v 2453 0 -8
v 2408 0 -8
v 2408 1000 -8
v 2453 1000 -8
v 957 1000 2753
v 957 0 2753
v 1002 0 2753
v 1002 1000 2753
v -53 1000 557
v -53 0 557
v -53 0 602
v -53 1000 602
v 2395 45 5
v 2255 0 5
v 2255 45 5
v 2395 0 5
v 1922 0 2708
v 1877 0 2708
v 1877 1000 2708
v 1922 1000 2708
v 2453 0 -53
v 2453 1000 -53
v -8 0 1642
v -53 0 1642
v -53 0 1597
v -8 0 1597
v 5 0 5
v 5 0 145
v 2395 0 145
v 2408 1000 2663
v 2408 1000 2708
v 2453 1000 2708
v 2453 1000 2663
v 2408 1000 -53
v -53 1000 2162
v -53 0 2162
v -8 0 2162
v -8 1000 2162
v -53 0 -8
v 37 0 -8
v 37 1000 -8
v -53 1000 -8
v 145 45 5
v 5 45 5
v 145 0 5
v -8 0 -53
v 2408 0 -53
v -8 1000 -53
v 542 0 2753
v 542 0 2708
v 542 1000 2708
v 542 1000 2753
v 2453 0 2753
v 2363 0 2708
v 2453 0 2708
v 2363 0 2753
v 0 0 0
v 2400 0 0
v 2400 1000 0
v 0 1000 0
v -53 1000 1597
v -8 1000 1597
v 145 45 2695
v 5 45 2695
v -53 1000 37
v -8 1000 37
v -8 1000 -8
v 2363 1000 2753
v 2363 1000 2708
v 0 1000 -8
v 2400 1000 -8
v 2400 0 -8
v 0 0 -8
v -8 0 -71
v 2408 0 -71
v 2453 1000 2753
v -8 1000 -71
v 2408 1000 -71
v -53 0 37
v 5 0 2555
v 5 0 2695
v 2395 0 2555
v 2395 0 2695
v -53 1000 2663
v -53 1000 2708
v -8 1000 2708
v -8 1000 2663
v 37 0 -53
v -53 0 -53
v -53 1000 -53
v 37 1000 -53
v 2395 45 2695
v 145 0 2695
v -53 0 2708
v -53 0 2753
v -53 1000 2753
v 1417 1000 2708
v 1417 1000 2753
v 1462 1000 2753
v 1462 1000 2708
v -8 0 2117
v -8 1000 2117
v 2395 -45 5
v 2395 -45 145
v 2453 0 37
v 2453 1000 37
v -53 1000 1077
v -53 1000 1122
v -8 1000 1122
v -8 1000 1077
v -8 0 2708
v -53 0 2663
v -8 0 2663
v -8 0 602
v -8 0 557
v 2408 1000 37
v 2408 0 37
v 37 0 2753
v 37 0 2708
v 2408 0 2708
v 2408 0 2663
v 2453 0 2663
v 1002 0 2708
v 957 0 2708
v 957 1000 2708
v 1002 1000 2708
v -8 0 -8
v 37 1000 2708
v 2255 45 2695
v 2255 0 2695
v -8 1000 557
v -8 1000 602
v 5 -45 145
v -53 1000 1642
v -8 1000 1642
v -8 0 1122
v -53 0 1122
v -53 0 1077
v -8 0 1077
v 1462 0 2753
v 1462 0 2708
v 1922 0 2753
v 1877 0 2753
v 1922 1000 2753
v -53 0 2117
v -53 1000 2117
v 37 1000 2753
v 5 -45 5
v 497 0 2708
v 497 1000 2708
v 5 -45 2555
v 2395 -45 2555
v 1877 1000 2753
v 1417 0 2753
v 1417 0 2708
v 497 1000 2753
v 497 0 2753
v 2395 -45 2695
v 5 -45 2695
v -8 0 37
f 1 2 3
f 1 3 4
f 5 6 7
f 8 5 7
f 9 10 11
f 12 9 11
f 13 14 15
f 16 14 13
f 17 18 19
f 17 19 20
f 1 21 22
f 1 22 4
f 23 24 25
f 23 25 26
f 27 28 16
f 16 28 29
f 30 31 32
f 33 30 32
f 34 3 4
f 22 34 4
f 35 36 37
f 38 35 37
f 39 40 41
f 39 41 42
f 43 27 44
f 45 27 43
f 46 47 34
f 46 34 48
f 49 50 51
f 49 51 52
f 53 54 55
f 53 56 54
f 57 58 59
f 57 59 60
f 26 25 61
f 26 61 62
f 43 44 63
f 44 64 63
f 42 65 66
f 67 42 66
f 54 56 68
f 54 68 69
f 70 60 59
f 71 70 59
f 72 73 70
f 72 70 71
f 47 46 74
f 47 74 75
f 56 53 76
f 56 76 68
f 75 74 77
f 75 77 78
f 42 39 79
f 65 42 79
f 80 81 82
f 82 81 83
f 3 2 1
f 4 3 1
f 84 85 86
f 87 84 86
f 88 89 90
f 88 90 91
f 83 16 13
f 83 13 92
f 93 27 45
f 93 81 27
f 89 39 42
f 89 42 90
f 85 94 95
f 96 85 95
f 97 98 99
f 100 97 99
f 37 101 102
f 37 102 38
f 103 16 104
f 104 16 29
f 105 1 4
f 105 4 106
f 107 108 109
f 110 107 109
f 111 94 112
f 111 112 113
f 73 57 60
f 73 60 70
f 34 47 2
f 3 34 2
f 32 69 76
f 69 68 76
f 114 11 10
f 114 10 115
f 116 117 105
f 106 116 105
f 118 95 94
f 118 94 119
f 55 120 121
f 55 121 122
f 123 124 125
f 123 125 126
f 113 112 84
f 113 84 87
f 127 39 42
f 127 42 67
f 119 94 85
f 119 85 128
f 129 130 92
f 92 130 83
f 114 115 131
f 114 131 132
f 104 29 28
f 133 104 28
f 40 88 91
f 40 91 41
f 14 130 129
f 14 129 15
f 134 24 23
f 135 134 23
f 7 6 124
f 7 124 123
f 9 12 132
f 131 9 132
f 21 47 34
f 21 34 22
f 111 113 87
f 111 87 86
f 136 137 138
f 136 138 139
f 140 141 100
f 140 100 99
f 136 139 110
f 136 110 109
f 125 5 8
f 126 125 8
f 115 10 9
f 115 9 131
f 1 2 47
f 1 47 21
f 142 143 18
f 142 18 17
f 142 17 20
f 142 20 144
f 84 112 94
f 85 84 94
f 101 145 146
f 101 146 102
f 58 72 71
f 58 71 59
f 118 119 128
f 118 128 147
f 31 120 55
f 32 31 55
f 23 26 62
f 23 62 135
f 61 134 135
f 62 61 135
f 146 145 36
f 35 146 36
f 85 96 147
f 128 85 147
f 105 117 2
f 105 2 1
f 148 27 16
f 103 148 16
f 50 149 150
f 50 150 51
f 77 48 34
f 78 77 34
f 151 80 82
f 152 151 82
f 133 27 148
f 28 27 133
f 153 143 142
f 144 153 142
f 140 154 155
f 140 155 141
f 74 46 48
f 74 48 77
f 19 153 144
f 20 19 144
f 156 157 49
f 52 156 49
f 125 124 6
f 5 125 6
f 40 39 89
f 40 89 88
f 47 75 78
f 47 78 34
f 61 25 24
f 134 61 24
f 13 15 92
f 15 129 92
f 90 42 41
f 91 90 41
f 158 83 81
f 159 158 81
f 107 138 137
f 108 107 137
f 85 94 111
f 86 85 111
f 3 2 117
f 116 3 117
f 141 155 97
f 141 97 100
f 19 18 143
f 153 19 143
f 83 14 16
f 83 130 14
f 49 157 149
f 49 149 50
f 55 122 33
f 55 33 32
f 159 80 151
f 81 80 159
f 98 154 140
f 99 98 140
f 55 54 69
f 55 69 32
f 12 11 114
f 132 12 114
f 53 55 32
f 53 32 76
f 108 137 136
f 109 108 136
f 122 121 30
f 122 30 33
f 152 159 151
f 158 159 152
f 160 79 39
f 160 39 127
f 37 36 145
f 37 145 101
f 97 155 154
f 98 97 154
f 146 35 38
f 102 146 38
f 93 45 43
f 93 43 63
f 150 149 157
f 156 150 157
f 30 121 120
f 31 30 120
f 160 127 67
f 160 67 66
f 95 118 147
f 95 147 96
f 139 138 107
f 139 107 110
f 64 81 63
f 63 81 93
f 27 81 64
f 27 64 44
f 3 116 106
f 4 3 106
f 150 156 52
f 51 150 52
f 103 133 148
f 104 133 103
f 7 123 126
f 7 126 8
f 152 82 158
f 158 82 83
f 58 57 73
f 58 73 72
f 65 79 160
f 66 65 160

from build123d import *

# Parameters (mm, degrees)
F0_W     = 140
F0_H     = 140
F0_H_2   = 2410
F1_DEPTH = 45
F0_W_2   = 2110
F2_DEPTH = 45
F3_DEPTH = 1000
F0_W_3   = 45
F0_H_3   = 45
F4_DEPTH = 1000
F5_DEPTH = 1000
F6_DEPTH = 1000
F7_DEPTH = 1000
F8_DEPTH = 1000


with BuildPart() as f1:
    # F0 (on Front) → F1 (new body)
    with BuildSketch(Plane.XZ):
        with Locations((75, 75)):
            Rectangle(F0_W, F0_H)
        with Locations((75, 1350)):
            Rectangle(F0_W, F0_H_2)
        with Locations((75, 2625)):
            Rectangle(F0_W, F0_H)
    extrude(amount=-F1_DEPTH)


with BuildPart() as f1b:
    # F0 (on Front) → F1, piece 2 (new body)
    with BuildSketch(Plane.XZ):
        with Locations((2325, 75)):
            Rectangle(F0_W, F0_H)
        with Locations((2325, 1350)):
            Rectangle(F0_W, F0_H_2)
        with Locations((2325, 2625)):
            Rectangle(F0_W, F0_H)
    extrude(amount=-F1_DEPTH)


with BuildPart() as f2:
    # F0 (on Front) → F2 (new body)
    with BuildSketch(Plane.XZ):
        with Locations((75, 75)):
            Rectangle(F0_W, F0_H)
        with Locations((1200, 75)):
            Rectangle(F0_W_2, F0_H)
        with Locations((2325, 75)):
            Rectangle(F0_W, F0_H)
    extrude(amount=F2_DEPTH)


with BuildPart() as f2b:
    # F0 (on Front) → F2, piece 2 (new body)
    with BuildSketch(Plane.XZ):
        with Locations((75, 2625)):
            Rectangle(F0_W, F0_H)
        with Locations((1200, 2625)):
            Rectangle(F0_W_2, F0_H)
        with Locations((2325, 2625)):
            Rectangle(F0_W, F0_H)
    extrude(amount=F2_DEPTH)


with BuildPart() as f3:
    # F0 (on Front) → F3 (new body)
    with BuildSketch(Plane.XZ):
        Polygon((37, -8), (0, -8), (-8, -8), (-53, -8), (-53, -53), (-8, -53), (37, -53), align=None)
    extrude(amount=-F3_DEPTH)


with BuildPart() as f3b:
    # F0 (on Front) → F3, piece 2 (new body)
    with BuildSketch(Plane.XZ):
        Polygon((-8, 2708), (0, 2708), (37, 2708), (37, 2753), (-8, 2753), align=None)
        with Locations((-30.5, 2730.5)):
            Rectangle(F0_W_3, F0_H_3)
    extrude(amount=-F3_DEPTH)


with BuildPart() as f3c:
    # F0 (on Front) → F3, piece 3 (new body)
    with BuildSketch(Plane.XZ):
        with Locations((2430.5, -30.5)):
            Rectangle(F0_W_3, F0_H_3)
    extrude(amount=-F3_DEPTH)


with BuildPart() as f3d:
    # F0 (on Front) → F3, piece 4 (new body)
    with BuildSketch(Plane.XZ):
        Polygon((2363, 2708), (2400, 2708), (2408, 2708), (2408, 2753), (2363, 2753), align=None)
        with Locations((2430.5, 2730.5)):
            Rectangle(F0_W_3, F0_H_3)
    extrude(amount=-F3_DEPTH)


with BuildPart() as f4:
    # F0 (on Front) → F4 (new body)
    with BuildSketch(Plane.XZ):
        with Locations((-30.5, 2685.5)):
            Rectangle(F0_W_3, F0_H_3)
    extrude(amount=-F4_DEPTH)


with BuildPart() as f4b:
    # F0 (on Front) → F4, piece 2 (new body)
    with BuildSketch(Plane.XZ):
        with Locations((2430.5, 2685.5)):
            Rectangle(F0_W_3, F0_H_3)
    extrude(amount=-F4_DEPTH)


with BuildPart() as f4c:
    # F0 (on Front) → F4, piece 3 (new body)
    with BuildSketch(Plane.XZ):
        with Locations((2430.5, 14.5)):
            Rectangle(F0_W_3, F0_H_3)
    extrude(amount=-F4_DEPTH)


with BuildPart() as f4d:
    # F0 (on Front) → F4, piece 4 (new body)
    with BuildSketch(Plane.XZ):
        with Locations((-30.5, 14.5)):
            Rectangle(F0_W_3, F0_H_3)
    extrude(amount=-F4_DEPTH)


with BuildPart() as f5:
    # F0 (on Front) → F5 (new body)
    with BuildSketch(Plane.XZ):
        Polygon((2354.4380664825, -53), (37, -53), (-8, -53), (-8, -71), (2408, -71), (2408, -53), align=None)
    extrude(amount=-F5_DEPTH)


with BuildPart() as f6:
    # F0 (on Front) → F6 (new body)
    with BuildSketch(Plane.XZ):
        Polygon((145, 0), (0, 0), (0, -8), (37, -8), (2354.4380664825, -8), (2400, -8), (2400, 0), (2255, 0), align=None)
    extrude(amount=-F6_DEPTH)


with BuildPart() as f7:
    # F0 (on Front) → F7 (new body)
    with BuildSketch(Plane.XZ):
        with Locations((519.5, 2730.5)):
            Rectangle(F0_W_3, F0_H_3)
    extrude(amount=-F7_DEPTH)


with BuildPart() as f7b:
    # F0 (on Front) → F7, piece 2 (new body)
    with BuildSketch(Plane.XZ):
        with Locations((979.5, 2730.5)):
            Rectangle(F0_W_3, F0_H_3)
    extrude(amount=-F7_DEPTH)


with BuildPart() as f7c:
    # F0 (on Front) → F7, piece 3 (new body)
    with BuildSketch(Plane.XZ):
        with Locations((1439.5, 2730.5)):
            Rectangle(F0_W_3, F0_H_3)
    extrude(amount=-F7_DEPTH)


with BuildPart() as f7d:
    # F0 (on Front) → F7, piece 4 (new body)
    with BuildSketch(Plane.XZ):
        with Locations((1899.5, 2730.5)):
            Rectangle(F0_W_3, F0_H_3)
    extrude(amount=-F7_DEPTH)


with BuildPart() as f8:
    # F0 (on Front) → F8 (new body)
    with BuildSketch(Plane.XZ):
        with Locations((-30.5, 579.5)):
            Rectangle(F0_W_3, F0_H_3)
    extrude(amount=-F8_DEPTH)


with BuildPart() as f8b:
    # F0 (on Front) → F8, piece 2 (new body)
    with BuildSketch(Plane.XZ):
        with Locations((-30.5, 1099.5)):
            Rectangle(F0_W_3, F0_H_3)
    extrude(amount=-F8_DEPTH)


with BuildPart() as f8c:
    # F0 (on Front) → F8, piece 3 (new body)
    with BuildSketch(Plane.XZ):
        with Locations((-30.5, 1619.5)):
            Rectangle(F0_W_3, F0_H_3)
    extrude(amount=-F8_DEPTH)


with BuildPart() as f8d:
    # F0 (on Front) → F8, piece 4 (new body)
    with BuildSketch(Plane.XZ):
        with Locations((-30.5, 2139.5)):
            Rectangle(F0_W_3, F0_H_3)
    extrude(amount=-F8_DEPTH)


solid = Compound([f1.part, f1b.part, f2.part, f2b.part, f3.part, f3b.part, f3c.part, f3d.part, f4.part, f4b.part, f4c.part, f4d.part, f5.part, f6.part, f7.part, f7b.part, f7c.part, f7d.part, f8.part, f8b.part, f8c.part, f8d.part])
